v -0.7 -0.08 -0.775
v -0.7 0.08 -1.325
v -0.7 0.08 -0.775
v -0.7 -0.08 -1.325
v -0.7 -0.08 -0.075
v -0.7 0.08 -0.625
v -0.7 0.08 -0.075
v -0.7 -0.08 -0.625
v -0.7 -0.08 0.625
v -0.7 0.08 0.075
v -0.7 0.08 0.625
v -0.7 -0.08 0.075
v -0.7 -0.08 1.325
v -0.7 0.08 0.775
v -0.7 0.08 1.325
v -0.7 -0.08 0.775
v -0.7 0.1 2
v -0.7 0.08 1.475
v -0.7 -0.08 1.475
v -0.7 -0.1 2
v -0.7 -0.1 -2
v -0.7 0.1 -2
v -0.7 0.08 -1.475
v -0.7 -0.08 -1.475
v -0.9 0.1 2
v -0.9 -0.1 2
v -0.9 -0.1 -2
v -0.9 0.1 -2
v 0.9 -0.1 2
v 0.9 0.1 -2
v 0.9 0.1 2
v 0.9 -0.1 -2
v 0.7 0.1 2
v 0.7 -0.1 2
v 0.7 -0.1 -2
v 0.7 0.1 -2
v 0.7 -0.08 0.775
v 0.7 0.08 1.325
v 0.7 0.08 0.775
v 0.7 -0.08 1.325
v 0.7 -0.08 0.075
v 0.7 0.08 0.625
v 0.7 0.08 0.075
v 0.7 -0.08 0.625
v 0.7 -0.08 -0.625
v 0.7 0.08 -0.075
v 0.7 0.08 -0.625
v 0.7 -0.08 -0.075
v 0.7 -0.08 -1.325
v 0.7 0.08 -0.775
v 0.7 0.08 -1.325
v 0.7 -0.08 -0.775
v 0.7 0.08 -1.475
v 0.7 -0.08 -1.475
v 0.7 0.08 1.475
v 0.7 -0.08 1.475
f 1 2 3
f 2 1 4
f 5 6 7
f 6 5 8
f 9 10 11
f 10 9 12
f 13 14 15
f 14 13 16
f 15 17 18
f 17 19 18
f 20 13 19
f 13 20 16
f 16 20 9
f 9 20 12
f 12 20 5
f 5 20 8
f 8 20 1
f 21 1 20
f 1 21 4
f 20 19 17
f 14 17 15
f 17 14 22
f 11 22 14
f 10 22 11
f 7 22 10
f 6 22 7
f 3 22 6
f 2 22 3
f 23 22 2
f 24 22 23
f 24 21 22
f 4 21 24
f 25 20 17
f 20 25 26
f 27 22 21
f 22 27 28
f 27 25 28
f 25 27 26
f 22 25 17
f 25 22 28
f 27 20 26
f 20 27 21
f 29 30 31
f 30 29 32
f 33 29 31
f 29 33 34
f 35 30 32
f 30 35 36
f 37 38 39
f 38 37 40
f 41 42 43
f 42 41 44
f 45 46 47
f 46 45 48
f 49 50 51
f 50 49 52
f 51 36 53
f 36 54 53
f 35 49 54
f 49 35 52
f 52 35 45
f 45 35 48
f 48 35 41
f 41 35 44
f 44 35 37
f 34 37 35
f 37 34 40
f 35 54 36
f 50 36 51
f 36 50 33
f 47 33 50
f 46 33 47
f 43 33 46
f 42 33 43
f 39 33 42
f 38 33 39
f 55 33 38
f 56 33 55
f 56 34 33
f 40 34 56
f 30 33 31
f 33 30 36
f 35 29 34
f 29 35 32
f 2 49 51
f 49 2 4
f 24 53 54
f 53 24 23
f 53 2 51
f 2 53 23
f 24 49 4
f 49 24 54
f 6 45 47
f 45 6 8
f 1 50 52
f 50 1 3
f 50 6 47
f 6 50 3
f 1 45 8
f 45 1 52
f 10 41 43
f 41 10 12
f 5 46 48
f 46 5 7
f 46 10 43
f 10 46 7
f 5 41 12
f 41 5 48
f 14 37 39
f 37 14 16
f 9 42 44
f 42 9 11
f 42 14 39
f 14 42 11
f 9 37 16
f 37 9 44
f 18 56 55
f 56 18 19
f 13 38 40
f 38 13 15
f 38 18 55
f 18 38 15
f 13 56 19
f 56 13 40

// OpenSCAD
module Ladder_01(){

    color("#A1662F"){
    translate([-0.8,0,0])
    cube([0.2,0.2,4], center = true);

    translate([0.8,0,0])
    cube([0.2,0.2,4], center = true);   
    }  
    color("#4d3737"){
        for(i= [-1.4:0.7:1.4]){
            translate([0,0,i])
            cube([1.6,0.16,0.15], center = true);
            }
        }
    
}

Ladder_01();



// Written by Nicolì Angelo (Gengio) 2024: 
// MIT License

//Permission is hereby granted, free of charge, to any person obtaining a copy of this software and associated documentation files (the "Software"), to deal in the Software without restriction, including without limitation the rights to use, copy, modify, merge, publish, distribute, sublicense, and/or sell copies of the Software, and to permit persons to whom the Software is furnished to do so, subject to the following conditions:

//The above copyright notice and this permission notice shall be included in all copies or substantial portions of the Software.

//THE SOFTWARE IS PROVIDED "AS IS", WITHOUT WARRANTY OF ANY KIND, EXPRESS OR IMPLIED, INCLUDING BUT NOT LIMITED TO THE WARRANTIES OF MERCHANTABILITY, FITNESS FOR A PARTICULAR PURPOSE AND NONINFRINGEMENT. IN NO EVENT SHALL THE AUTHORS OR COPYRIGHT HOLDERS BE LIABLE FOR ANY CLAIM, DAMAGES OR OTHER LIABILITY, WHETHER IN AN ACTION OF CONTRACT, TORT OR OTHERWISE, ARISING FROM, OUT OF OR IN CONNECTION WITH THE SOFTWARE OR THE USE OR OTHER DEALINGS IN THE SOFTWARE.
